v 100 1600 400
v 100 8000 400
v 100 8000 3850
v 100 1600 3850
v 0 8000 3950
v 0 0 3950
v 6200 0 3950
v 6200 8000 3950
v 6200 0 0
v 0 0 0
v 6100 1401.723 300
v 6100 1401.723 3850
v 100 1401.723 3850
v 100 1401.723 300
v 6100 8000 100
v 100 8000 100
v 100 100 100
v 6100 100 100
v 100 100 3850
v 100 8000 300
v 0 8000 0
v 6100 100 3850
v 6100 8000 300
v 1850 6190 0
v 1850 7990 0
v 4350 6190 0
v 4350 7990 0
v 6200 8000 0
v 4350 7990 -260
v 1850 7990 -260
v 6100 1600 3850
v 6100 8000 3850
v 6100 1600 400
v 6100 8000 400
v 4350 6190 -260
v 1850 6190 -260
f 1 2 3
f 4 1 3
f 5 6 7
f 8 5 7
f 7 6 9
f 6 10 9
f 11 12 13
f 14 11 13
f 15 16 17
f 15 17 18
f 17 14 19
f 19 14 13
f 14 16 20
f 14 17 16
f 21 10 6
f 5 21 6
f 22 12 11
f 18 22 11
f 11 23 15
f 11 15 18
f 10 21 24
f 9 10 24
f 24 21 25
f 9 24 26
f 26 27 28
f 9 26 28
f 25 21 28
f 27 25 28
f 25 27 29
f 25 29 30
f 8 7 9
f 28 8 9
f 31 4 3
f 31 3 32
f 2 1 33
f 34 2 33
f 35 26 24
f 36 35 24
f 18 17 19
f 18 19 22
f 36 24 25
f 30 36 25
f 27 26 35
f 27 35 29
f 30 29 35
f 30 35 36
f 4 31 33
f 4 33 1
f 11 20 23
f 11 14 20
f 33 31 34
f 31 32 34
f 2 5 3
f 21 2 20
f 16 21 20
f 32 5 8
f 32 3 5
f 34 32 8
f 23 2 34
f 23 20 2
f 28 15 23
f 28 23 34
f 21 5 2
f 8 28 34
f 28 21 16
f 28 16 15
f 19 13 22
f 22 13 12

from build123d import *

# Parameters (mm, degrees)
SKETCH1_W           = 6200
SKETCH1_H           = 8000
BOSS_EXTRUDE1_DEPTH = 100
SKETCH2_W           = 6200
SKETCH2_H           = 100
BOSS_EXTRUDE2_DEPTH = 3850
SKETCH3_W           = 6200
SKETCH3_H           = 8000
BOSS_EXTRUDE3_DEPTH = 100
SKETCH5_W           = 3750
SKETCH5_H           = 7900
BOSS_EXTRUDE4_DEPTH = 100
SKETCH6_W           = 3750
SKETCH6_H           = 7900
BOSS_EXTRUDE5_DEPTH = 100
SKETCH7_W           = 2500
SKETCH7_H           = 1800
BOSS_EXTRUDE6_DEPTH = 260
SKETCH8_W           = 6100
SKETCH8_H           = 198.276900897
BOSS_EXTRUDE7_DEPTH = 3550
SKETCH9_W           = 6000
SKETCH9_H           = 100
BOSS_EXTRUDE8_DEPTH = 6400


with BuildPart() as part:
    # Sketch1 → Boss-Extrude1 (new body)
    with BuildSketch(Plane.XY):
        with Locations((3100, 4000)):
            Rectangle(SKETCH1_W, SKETCH1_H)
    extrude(amount=BOSS_EXTRUDE1_DEPTH)

    # Sketch2 → Boss-Extrude2 (add)
    with BuildSketch(Plane.XY.offset(100)):
        with Locations((3100, 50)):
            Rectangle(SKETCH2_W, SKETCH2_H)
    extrude(amount=BOSS_EXTRUDE2_DEPTH)

    # Sketch3 → Boss-Extrude3 (add)
    with BuildSketch(Plane.XY.offset(3950)):
        with Locations((3100, 4000)):
            Rectangle(SKETCH3_W, SKETCH3_H)
    extrude(amount=-BOSS_EXTRUDE3_DEPTH)

    # Sketch5 → Boss-Extrude4 (add)
    with BuildSketch(Plane(origin=(6200, 0, 0), x_dir=(0, 0, -1), z_dir=(1, 0, 0))):
        with Locations((-1975, 4050)):
            Rectangle(SKETCH5_W, SKETCH5_H)
    extrude(amount=-BOSS_EXTRUDE4_DEPTH)

    # Sketch6 → Boss-Extrude5 (add)
    with BuildSketch(Plane.ZY):
        with Locations((1975, 4050)):
            Rectangle(SKETCH6_W, SKETCH6_H)
    extrude(amount=-BOSS_EXTRUDE5_DEPTH)

    # Sketch7 → Boss-Extrude6 (add)
    with BuildSketch(Plane(origin=(0, 0, 0), x_dir=(-1, 0, 0), z_dir=(0, 0, -1))):
        with Locations((-3100, 7090)):
            Rectangle(SKETCH7_W, SKETCH7_H)
    extrude(amount=BOSS_EXTRUDE6_DEPTH)

    # Sketch8 → Boss-Extrude7 (add)
    with BuildSketch(Plane(origin=(0, 0, 3850), x_dir=(-1, 0, 0), z_dir=(0, 0, -1))):
        with Locations((-3050, 1500.861549552)):
            Rectangle(SKETCH8_W, SKETCH8_H)
    extrude(amount=BOSS_EXTRUDE7_DEPTH)

    # Sketch9 → Boss-Extrude8 (add)
    with BuildSketch(Plane(origin=(0, 1600, 0), x_dir=(1, 0, 0), z_dir=(0, 1, 0))):
        with Locations((3100, -350)):
            Rectangle(SKETCH9_W, SKETCH9_H)
    extrude(amount=BOSS_EXTRUDE8_DEPTH)


solid = part.part
